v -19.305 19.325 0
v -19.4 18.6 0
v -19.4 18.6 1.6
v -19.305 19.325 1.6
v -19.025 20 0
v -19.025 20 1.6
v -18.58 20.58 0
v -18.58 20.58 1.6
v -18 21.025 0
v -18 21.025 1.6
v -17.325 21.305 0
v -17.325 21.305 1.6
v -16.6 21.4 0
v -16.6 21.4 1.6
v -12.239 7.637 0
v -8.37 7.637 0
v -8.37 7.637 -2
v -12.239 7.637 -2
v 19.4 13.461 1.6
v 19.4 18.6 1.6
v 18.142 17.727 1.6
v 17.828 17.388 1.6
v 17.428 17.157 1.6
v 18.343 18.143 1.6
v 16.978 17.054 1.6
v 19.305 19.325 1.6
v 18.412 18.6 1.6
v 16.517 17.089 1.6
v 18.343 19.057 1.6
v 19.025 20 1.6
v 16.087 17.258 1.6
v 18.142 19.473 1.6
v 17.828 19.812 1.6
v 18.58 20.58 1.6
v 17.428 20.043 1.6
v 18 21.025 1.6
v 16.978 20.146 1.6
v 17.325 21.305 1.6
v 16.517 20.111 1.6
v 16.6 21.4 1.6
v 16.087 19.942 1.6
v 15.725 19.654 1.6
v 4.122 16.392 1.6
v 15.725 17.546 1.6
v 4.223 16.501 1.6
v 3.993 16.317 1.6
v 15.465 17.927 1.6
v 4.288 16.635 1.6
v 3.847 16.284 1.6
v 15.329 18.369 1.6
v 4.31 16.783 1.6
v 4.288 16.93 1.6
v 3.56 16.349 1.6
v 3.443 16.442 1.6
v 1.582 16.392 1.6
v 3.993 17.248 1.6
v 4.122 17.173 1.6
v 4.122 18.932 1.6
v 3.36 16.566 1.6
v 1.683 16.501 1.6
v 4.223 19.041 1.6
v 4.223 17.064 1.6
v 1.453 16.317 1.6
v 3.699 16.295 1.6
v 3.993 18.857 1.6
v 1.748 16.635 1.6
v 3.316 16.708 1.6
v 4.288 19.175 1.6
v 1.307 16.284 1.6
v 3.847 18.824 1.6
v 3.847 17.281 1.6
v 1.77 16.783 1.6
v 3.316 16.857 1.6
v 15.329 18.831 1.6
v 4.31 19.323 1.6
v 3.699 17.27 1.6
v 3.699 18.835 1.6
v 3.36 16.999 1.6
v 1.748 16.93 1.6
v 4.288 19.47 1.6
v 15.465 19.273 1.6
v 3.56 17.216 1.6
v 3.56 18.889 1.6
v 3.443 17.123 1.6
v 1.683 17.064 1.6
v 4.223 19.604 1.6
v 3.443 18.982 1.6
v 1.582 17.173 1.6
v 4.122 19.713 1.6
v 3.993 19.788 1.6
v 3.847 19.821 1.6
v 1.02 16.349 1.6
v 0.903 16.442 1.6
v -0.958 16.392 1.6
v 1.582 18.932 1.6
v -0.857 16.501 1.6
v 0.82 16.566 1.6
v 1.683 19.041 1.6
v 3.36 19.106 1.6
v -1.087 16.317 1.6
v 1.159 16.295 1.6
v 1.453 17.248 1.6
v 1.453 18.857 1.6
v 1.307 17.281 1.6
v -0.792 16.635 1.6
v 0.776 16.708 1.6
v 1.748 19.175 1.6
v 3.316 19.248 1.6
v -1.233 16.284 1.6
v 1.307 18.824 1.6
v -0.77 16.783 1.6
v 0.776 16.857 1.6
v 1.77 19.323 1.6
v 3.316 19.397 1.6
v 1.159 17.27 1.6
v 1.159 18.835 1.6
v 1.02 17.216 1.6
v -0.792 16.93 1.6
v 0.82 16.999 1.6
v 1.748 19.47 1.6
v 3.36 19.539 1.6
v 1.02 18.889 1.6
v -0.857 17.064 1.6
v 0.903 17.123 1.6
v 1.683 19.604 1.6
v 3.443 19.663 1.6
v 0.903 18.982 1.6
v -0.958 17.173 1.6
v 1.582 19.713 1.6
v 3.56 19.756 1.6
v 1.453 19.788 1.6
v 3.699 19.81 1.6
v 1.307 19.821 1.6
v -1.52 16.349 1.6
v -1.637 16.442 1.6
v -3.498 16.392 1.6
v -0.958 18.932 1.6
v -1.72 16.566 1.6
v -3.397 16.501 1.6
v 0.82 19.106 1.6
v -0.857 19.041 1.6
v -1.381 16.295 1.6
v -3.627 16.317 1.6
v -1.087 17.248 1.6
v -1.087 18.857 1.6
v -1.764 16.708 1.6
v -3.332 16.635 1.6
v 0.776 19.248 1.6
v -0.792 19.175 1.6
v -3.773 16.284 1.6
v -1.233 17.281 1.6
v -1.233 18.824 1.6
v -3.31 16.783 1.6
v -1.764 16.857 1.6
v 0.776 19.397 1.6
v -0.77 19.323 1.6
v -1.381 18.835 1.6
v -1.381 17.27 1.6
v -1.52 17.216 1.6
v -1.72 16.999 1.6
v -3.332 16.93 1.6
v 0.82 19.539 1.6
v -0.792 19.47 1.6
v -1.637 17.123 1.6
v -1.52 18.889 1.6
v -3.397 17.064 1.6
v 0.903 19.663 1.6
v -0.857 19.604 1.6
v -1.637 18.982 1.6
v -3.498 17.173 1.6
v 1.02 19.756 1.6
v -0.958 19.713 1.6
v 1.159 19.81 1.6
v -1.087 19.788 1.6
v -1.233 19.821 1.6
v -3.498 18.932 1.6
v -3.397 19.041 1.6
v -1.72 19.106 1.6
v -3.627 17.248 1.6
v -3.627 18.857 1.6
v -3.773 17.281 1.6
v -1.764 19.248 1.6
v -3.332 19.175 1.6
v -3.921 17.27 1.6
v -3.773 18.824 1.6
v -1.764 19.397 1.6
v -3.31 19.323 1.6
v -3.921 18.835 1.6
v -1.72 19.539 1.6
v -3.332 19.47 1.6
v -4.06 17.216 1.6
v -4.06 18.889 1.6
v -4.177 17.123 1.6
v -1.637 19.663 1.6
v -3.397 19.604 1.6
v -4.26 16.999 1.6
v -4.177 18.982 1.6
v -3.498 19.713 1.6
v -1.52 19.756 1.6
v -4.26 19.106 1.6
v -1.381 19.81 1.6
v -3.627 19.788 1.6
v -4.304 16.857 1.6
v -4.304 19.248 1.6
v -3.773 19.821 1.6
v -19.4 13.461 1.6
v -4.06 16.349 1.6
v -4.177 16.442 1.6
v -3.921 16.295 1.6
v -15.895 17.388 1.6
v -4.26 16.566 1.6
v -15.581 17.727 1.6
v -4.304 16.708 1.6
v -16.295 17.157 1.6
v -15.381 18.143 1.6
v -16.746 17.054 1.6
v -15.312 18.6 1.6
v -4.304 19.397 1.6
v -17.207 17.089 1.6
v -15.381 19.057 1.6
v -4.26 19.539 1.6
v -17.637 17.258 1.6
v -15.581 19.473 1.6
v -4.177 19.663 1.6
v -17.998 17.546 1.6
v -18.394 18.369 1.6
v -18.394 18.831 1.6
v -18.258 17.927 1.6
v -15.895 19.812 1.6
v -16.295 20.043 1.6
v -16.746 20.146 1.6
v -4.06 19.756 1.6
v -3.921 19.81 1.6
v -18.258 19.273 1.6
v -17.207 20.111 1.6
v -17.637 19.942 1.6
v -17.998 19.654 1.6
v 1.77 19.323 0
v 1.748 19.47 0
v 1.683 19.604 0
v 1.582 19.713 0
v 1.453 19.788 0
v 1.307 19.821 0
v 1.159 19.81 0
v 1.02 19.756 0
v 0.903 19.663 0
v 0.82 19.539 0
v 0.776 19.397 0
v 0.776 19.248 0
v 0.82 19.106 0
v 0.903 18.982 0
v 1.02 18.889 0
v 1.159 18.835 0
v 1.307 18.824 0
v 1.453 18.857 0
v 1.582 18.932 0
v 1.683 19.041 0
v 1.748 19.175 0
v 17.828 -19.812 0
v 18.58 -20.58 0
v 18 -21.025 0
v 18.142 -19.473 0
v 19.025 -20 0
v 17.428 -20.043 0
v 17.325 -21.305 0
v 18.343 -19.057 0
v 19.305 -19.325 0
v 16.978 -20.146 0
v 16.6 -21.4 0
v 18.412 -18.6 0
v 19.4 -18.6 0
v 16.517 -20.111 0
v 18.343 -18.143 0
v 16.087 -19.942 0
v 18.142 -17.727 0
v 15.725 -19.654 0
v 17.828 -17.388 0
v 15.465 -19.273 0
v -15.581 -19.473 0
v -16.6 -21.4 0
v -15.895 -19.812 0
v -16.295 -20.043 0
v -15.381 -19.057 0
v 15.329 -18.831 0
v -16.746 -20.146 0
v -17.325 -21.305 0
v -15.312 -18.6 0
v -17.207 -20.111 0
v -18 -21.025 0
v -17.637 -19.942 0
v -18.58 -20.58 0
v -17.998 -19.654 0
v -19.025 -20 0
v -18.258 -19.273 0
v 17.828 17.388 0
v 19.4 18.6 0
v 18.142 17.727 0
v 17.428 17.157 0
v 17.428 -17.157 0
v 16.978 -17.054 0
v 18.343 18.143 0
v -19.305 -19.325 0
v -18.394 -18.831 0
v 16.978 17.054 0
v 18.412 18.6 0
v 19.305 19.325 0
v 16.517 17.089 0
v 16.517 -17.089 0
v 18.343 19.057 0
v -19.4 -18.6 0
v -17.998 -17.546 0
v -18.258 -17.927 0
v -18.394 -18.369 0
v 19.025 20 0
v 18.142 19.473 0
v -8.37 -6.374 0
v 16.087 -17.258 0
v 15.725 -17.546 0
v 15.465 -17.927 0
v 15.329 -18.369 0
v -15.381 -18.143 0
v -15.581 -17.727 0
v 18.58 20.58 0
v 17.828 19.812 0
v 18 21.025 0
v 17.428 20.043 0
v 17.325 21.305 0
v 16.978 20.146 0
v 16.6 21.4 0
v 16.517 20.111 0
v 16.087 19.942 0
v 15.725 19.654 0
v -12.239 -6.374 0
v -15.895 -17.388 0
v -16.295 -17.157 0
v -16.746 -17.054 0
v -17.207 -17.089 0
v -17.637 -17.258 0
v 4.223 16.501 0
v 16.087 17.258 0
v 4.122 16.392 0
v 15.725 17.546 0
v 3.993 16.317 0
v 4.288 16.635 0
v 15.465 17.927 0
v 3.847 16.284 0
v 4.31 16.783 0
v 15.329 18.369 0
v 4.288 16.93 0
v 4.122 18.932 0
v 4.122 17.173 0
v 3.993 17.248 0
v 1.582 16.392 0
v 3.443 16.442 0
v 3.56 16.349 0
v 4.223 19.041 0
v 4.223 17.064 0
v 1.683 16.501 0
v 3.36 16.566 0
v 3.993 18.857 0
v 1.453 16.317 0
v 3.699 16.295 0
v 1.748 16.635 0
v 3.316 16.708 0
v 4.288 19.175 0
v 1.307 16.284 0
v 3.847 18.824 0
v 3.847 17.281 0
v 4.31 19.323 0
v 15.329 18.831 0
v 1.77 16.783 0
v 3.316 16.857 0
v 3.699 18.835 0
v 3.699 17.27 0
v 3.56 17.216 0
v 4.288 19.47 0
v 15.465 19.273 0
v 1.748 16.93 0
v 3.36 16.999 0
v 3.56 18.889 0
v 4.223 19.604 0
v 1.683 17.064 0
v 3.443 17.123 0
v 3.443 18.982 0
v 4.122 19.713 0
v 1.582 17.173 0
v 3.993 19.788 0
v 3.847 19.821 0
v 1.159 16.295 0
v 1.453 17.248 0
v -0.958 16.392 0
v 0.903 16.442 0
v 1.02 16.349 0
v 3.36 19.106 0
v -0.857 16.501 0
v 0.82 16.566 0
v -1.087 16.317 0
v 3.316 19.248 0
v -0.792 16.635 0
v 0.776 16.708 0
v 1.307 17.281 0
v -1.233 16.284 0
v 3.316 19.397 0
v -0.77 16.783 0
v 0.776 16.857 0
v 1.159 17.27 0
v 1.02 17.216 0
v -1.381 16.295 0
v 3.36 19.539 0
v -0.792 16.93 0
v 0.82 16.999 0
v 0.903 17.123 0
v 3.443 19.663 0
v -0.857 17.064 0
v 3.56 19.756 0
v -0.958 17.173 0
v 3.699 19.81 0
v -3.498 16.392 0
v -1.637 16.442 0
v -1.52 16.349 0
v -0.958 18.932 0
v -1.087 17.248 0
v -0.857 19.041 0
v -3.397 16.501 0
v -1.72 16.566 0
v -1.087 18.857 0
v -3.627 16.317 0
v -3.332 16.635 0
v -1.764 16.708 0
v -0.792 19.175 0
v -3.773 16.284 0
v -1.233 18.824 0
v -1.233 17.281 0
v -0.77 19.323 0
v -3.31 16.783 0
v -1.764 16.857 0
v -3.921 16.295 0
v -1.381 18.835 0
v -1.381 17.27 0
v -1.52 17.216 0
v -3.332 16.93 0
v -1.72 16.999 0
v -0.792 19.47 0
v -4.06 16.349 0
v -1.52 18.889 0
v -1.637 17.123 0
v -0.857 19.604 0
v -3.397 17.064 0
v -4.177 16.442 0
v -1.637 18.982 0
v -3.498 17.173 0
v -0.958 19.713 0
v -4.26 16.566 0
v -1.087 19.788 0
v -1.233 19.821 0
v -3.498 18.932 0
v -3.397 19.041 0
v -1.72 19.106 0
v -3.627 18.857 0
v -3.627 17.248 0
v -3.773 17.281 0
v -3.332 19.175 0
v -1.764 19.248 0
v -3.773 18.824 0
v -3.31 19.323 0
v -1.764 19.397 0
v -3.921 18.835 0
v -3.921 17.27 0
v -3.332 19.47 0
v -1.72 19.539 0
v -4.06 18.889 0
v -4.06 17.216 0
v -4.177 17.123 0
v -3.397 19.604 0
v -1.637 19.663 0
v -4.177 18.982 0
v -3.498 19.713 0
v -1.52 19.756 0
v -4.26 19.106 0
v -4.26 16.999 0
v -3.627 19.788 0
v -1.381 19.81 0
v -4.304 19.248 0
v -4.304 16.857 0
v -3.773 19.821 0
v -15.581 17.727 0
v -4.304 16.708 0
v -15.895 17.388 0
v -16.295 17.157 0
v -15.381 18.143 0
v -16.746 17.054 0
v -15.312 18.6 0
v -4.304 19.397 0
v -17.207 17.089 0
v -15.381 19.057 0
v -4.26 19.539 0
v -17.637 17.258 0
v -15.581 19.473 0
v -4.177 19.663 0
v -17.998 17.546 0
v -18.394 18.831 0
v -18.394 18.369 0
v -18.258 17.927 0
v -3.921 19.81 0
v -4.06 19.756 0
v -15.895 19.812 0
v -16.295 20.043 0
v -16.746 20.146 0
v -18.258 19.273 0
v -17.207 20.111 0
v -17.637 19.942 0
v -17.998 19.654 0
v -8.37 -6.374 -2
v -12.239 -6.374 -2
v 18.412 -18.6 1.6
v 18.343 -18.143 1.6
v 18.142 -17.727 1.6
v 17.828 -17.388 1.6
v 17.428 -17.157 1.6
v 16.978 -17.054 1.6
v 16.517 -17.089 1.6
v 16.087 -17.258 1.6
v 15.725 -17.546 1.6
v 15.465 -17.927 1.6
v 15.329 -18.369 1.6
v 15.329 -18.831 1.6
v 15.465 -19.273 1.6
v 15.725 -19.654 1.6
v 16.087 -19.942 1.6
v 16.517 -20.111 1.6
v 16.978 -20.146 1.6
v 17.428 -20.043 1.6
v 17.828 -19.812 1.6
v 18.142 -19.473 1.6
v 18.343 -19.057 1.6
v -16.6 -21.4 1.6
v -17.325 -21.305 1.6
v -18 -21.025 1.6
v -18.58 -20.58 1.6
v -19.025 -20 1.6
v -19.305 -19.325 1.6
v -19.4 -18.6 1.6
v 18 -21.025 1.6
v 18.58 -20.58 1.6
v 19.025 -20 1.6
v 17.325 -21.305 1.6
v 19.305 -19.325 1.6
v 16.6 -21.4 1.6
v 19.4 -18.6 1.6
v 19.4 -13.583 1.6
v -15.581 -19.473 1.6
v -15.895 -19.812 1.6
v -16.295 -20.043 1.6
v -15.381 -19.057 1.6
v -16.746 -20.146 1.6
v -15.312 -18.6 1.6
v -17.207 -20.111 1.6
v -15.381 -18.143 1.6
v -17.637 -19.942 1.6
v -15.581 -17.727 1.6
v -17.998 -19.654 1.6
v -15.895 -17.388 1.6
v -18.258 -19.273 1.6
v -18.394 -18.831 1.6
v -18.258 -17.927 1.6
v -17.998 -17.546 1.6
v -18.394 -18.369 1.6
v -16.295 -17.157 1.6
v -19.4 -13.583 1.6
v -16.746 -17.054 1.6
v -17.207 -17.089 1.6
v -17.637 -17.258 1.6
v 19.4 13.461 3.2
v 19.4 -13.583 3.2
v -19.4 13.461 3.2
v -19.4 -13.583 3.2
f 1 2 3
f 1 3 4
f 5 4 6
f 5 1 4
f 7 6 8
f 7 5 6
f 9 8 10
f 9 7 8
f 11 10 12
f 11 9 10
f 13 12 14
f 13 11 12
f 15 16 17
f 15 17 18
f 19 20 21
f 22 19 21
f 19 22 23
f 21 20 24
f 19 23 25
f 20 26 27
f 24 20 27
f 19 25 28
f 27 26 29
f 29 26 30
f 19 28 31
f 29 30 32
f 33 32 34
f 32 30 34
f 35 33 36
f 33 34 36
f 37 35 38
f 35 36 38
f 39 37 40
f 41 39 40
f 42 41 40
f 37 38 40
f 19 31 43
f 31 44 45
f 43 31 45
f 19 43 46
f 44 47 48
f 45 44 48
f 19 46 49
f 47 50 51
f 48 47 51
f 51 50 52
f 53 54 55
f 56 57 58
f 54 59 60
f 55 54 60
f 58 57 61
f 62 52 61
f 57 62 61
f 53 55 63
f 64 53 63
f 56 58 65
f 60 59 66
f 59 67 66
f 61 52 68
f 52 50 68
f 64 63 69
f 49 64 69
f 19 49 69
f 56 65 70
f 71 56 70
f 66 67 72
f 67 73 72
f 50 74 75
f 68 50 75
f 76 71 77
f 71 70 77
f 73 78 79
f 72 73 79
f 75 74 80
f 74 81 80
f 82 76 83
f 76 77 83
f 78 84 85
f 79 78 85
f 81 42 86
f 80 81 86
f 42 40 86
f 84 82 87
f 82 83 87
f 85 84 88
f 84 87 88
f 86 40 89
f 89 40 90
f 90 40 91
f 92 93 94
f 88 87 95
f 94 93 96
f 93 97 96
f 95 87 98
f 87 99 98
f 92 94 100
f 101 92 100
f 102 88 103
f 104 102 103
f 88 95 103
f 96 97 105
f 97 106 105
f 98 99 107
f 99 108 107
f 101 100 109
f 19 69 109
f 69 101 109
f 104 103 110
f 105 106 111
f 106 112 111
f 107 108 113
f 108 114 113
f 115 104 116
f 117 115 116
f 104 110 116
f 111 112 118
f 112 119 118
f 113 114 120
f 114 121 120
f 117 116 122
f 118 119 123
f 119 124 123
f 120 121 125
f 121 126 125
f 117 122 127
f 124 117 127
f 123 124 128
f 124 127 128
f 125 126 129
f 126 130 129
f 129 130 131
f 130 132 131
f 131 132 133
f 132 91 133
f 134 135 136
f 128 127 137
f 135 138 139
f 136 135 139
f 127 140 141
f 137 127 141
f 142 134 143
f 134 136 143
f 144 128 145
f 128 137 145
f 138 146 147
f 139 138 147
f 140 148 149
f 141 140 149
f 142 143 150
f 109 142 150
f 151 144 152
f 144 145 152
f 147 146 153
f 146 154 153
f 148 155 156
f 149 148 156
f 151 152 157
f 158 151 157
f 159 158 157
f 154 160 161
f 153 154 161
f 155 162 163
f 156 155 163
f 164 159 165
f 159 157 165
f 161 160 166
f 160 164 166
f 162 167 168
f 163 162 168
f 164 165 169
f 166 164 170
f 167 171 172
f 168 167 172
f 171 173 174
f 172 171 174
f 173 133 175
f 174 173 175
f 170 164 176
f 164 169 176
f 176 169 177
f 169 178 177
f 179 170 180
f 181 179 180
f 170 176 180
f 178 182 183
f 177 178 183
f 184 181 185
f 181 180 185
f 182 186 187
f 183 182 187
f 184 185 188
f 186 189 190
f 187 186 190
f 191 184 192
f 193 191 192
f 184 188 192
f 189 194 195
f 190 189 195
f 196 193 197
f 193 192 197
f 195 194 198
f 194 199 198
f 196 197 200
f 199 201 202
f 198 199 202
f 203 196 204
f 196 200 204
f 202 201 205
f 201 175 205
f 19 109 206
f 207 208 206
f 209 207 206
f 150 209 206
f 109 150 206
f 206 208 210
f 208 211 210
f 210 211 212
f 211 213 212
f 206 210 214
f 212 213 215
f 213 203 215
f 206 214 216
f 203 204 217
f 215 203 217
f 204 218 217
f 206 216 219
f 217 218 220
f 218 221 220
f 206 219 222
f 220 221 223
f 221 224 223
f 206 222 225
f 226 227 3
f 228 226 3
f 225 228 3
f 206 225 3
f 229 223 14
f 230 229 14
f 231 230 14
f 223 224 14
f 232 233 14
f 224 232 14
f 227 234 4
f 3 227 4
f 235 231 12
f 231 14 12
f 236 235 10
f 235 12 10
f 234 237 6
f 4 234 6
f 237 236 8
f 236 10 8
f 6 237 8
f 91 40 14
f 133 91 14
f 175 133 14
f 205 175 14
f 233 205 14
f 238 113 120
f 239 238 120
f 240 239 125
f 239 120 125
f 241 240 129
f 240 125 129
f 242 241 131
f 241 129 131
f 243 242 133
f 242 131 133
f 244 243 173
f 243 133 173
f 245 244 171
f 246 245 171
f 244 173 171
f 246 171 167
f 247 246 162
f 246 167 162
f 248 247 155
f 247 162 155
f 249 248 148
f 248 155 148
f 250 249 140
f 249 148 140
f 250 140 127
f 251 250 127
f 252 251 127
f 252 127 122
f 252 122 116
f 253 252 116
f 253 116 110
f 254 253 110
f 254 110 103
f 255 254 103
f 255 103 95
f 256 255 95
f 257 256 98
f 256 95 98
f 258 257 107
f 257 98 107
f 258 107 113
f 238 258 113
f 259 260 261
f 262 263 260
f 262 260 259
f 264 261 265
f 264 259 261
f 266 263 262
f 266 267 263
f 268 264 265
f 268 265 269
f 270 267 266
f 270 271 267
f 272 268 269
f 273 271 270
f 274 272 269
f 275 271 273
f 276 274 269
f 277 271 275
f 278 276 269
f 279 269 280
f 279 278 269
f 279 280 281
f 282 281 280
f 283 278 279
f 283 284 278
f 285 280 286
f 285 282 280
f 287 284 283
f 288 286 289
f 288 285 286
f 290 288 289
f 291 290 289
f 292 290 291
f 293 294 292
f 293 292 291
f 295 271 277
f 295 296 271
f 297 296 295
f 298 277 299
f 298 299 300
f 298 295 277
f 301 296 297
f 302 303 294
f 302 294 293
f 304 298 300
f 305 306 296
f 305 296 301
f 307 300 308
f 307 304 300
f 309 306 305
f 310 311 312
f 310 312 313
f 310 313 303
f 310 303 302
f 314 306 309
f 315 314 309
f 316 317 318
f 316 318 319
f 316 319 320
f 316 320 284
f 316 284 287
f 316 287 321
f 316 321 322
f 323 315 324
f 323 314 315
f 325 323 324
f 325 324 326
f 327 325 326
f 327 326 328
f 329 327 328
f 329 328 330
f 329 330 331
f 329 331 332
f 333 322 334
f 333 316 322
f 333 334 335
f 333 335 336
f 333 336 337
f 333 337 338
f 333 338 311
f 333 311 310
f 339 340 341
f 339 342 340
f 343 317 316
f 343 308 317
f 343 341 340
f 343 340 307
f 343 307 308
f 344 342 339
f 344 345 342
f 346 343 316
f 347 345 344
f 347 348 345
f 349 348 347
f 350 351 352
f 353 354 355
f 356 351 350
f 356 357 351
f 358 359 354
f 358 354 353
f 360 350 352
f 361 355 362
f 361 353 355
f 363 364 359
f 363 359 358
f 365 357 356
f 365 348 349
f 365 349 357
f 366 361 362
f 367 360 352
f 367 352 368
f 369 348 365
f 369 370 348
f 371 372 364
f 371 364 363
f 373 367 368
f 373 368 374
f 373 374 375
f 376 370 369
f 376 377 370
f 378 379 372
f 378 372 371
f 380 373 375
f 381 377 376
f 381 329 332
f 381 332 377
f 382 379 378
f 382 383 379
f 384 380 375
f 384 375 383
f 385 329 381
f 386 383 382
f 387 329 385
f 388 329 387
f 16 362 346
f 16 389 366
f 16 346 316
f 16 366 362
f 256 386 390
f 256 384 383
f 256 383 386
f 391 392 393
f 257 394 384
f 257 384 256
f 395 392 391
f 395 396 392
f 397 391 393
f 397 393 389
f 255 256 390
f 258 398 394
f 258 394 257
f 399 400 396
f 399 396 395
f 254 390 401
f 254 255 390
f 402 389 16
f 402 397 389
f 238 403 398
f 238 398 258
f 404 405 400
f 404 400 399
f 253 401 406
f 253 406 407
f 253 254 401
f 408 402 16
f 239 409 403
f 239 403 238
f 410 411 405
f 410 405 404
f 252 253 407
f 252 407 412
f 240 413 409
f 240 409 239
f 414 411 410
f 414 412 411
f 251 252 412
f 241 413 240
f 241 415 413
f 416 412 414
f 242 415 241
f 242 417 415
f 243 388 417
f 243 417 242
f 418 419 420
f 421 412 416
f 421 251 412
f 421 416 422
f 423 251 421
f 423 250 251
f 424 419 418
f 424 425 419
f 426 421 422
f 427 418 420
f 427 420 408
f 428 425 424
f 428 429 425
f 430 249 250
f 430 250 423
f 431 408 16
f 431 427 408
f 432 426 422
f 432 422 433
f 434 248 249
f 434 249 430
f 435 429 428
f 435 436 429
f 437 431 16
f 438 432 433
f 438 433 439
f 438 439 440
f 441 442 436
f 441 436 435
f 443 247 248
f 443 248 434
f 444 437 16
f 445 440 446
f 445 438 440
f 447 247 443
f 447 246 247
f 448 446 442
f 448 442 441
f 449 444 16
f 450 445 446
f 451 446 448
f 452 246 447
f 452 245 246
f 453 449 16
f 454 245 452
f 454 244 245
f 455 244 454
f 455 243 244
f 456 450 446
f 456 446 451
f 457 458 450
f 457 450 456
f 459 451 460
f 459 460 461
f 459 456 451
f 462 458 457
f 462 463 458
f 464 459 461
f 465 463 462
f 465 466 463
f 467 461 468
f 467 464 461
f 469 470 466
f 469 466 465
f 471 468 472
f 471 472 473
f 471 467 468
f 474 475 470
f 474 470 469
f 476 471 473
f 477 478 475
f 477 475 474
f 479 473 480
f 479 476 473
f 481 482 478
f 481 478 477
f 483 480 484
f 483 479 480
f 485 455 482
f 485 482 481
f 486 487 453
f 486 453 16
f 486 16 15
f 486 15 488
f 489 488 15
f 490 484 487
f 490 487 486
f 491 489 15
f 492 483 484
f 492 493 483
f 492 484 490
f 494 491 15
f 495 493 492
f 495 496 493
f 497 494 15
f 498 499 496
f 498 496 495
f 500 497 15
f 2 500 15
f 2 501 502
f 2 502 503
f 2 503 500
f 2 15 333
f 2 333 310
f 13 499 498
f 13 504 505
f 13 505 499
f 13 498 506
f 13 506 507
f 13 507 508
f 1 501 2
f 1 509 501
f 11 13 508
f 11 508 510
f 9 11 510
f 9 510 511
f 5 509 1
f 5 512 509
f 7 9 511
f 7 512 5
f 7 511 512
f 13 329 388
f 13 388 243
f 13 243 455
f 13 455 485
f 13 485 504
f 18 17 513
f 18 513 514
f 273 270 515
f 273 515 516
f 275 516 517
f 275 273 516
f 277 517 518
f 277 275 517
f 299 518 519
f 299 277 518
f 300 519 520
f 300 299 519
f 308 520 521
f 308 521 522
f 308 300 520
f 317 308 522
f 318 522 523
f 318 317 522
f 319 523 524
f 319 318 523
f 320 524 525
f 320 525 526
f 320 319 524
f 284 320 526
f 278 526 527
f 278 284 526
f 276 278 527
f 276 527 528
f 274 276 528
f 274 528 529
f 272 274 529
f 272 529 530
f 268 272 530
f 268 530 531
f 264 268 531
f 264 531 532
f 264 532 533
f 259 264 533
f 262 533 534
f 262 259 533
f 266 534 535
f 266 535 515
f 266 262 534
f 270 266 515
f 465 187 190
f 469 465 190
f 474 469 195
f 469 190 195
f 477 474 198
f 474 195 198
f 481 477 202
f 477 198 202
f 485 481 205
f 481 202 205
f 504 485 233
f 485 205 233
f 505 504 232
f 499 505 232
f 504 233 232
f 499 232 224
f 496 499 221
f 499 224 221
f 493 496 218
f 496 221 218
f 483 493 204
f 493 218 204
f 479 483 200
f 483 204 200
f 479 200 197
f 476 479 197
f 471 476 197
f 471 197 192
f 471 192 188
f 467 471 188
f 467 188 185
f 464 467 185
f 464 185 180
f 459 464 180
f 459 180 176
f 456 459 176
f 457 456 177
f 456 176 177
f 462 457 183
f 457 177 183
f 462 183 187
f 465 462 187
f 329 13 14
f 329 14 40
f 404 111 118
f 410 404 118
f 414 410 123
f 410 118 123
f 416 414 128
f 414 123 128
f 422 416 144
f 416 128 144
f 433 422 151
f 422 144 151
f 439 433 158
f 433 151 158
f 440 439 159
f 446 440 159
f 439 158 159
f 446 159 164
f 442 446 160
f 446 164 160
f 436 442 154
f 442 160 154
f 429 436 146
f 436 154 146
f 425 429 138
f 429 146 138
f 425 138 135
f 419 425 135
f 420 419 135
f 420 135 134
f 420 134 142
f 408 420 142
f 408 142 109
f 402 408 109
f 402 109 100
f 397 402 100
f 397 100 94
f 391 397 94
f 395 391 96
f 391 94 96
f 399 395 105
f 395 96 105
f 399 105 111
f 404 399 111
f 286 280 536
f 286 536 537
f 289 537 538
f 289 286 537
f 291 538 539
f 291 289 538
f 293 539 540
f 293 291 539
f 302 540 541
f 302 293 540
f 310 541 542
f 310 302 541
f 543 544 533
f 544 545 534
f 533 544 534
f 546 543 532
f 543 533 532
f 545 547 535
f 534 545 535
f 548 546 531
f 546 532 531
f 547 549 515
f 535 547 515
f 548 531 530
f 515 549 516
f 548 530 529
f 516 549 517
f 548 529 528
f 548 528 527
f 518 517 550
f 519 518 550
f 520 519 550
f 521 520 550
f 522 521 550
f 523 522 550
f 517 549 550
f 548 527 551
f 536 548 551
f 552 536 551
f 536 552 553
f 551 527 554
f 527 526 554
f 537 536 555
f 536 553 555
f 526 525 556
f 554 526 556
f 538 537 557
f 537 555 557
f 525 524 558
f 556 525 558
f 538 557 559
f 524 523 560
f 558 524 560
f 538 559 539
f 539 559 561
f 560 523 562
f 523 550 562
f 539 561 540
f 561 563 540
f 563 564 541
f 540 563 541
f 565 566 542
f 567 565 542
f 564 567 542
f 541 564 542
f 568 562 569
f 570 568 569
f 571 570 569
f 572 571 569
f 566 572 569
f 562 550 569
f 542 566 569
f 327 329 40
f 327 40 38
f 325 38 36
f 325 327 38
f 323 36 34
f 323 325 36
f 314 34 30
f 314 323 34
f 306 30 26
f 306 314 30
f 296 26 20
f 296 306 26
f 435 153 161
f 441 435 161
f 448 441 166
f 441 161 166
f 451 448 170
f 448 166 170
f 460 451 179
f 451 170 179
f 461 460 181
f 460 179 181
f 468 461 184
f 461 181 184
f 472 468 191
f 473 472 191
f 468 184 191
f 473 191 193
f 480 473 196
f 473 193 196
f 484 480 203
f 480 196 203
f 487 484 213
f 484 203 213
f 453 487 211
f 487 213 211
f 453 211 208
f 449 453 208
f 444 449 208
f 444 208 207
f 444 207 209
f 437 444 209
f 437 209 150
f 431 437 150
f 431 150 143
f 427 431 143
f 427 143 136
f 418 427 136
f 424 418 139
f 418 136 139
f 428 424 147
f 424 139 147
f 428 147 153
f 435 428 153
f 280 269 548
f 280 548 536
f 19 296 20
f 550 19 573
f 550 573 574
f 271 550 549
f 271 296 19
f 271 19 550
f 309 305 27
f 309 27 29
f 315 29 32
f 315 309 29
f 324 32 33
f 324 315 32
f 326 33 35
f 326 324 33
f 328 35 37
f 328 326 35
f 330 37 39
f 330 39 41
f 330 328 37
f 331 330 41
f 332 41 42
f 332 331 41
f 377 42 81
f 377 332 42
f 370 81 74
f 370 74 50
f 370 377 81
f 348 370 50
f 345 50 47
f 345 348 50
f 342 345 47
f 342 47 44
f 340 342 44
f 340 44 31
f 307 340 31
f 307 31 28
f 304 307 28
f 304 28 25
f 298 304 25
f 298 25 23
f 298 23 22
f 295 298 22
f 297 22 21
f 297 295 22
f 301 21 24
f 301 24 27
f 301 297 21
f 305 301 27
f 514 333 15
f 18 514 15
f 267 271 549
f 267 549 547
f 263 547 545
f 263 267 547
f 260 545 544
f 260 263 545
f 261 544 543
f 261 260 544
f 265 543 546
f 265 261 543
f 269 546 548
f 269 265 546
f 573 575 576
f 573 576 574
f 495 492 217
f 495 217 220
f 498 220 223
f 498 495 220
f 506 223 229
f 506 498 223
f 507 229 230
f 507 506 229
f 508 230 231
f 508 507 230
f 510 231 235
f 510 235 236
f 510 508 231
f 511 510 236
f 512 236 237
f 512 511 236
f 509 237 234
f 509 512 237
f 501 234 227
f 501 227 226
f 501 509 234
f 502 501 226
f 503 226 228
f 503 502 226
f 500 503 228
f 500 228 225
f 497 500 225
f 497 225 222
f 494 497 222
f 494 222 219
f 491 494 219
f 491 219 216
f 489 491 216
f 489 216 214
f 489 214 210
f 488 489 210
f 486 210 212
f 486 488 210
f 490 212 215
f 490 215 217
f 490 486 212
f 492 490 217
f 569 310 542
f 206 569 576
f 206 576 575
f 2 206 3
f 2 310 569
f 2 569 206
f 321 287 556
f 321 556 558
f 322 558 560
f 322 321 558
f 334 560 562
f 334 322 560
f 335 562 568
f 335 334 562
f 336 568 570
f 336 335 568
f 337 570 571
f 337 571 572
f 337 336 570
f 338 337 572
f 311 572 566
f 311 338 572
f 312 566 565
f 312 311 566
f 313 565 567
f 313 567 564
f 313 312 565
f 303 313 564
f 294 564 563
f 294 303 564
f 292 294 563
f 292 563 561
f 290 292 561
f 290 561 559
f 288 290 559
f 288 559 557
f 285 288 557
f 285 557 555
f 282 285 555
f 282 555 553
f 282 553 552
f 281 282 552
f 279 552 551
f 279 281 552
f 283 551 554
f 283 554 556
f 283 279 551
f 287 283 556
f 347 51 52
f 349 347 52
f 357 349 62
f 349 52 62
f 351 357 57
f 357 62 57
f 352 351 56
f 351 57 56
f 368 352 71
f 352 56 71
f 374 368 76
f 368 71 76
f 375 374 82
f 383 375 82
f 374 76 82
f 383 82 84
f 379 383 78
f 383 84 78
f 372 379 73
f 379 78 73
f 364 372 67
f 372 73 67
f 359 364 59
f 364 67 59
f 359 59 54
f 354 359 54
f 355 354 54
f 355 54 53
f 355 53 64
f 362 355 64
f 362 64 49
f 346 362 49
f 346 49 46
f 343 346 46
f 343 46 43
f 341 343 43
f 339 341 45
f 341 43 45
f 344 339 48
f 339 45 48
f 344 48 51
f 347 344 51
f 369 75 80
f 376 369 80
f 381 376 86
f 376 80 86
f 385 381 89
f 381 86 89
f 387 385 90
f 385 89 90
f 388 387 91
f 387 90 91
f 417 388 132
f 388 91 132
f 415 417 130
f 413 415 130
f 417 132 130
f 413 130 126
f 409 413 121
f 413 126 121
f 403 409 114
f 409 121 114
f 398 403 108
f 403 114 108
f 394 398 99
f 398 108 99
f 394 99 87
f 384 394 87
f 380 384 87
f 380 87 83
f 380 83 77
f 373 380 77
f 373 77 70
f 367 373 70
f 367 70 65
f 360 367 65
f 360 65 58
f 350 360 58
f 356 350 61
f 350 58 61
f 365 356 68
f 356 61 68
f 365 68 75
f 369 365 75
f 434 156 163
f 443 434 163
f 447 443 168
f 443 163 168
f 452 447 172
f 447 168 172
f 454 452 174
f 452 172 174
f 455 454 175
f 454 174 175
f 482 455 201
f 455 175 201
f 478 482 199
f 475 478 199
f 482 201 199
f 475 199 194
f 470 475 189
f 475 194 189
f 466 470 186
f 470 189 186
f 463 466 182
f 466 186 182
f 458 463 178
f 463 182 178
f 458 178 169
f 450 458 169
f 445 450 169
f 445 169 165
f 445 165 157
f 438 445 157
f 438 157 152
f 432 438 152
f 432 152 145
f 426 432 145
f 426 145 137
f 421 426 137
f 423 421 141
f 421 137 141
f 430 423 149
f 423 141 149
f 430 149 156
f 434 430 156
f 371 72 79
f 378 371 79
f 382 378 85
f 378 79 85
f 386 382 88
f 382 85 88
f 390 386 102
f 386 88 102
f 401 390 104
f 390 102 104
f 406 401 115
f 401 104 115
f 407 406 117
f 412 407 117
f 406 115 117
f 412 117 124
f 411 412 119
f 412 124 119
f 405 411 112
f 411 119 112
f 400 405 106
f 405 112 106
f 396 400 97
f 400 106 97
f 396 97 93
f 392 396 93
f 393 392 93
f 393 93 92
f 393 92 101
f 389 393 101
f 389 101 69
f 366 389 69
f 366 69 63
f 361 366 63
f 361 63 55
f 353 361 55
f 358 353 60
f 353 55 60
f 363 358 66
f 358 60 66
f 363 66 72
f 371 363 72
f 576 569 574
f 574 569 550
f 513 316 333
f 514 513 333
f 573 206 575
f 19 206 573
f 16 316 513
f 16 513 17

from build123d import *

# Parameters (mm, degrees)
SKIZZE1_R                       = 1.55
AUFSATZ_LINEAR_AUSTRAGEN1_DEPTH = 1.6
SKIZZE2_R                       = 0.5
SCHNITT_LINEAR_AUSTRAGEN1_DEPTH = 1.6
SKIZZE3_W                       = 38.8
SKIZZE3_H                       = 27.043851976
AUFSATZ_LINEAR_AUSTRAGEN2_DEPTH = 1.6
SKIZZE4_W                       = 3.86922581
SKIZZE4_H                       = 14.010670301
AUFSATZ_LINEAR_AUSTRAGEN3_DEPTH = 2


with BuildPart() as part:
    # Skizze1 → Aufsatz-Linear austragen1 (new body)
    with BuildSketch(Plane.XY):
        with BuildLine():
            Line((16.6, -21.4), (-16.6, -21.4))
            ThreePointArc((-16.6, -21.4), (-18.579898987, -20.579898987), (-19.4, -18.6))
            Line((-19.4, -18.6), (-19.4, 18.6))
            ThreePointArc((-19.4, 18.6), (-18.579898987, 20.579898987), (-16.6, 21.4))
            Line((-16.6, 21.4), (16.6, 21.4))
            ThreePointArc((16.6, 21.4), (18.579898987, 20.579898987), (19.4, 18.6))
            Line((19.4, 18.6), (19.4, -18.6))
            ThreePointArc((19.4, -18.6), (18.579898987, -20.579898987), (16.6, -21.4))
        make_face()
        with Locations((-16.861682243, 18.6)):
            Circle(SKIZZE1_R, mode=Mode.SUBTRACT)
        with Locations((-16.861682243, -18.6)):
            Circle(SKIZZE1_R, mode=Mode.SUBTRACT)
        with Locations((16.861682243, -18.6)):
            Circle(SKIZZE1_R, mode=Mode.SUBTRACT)
        with Locations((16.861682243, 18.6)):
            Circle(SKIZZE1_R, mode=Mode.SUBTRACT)
    extrude(amount=AUFSATZ_LINEAR_AUSTRAGEN1_DEPTH)

    # Skizze2 → Schnitt-Linear austragen1 (cut)
    with BuildSketch(Plane.XY.offset(1.6)):
        with Locations((-3.81, 16.782506105)):
            Circle(SKIZZE2_R)
        with Locations((-1.27, 16.782506105)):
            Circle(SKIZZE2_R)
        with Locations((1.27, 16.782506105)):
            Circle(SKIZZE2_R)
        with Locations((3.81, 16.782506105)):
            Circle(SKIZZE2_R)
        with Locations((-1.27, 19.322506105)):
            Circle(SKIZZE2_R)
        with Locations((1.27, 19.322506105)):
            Circle(SKIZZE2_R)
        with Locations((3.81, 19.322506105)):
            Circle(SKIZZE2_R)
        with Locations((-3.81, 19.322506105)):
            Circle(SKIZZE2_R)
    extrude(amount=-SCHNITT_LINEAR_AUSTRAGEN1_DEPTH, mode=Mode.SUBTRACT)

    # Skizze3 → Aufsatz-Linear austragen2 (add)
    with BuildSketch(Plane.XY.offset(1.6)):
        with Locations((0, -0.061093039)):
            Rectangle(SKIZZE3_W, SKIZZE3_H)
    extrude(amount=AUFSATZ_LINEAR_AUSTRAGEN2_DEPTH)

    # Skizze4 → Aufsatz-Linear austragen3 (add)
    with BuildSketch(Plane(origin=(0, 0, 0), x_dir=(-1, 0, 0), z_dir=(0, 0, -1))):
        with Locations((10.304359262, 0.631294738)):
            Rectangle(SKIZZE4_W, SKIZZE4_H)
    extrude(amount=AUFSATZ_LINEAR_AUSTRAGEN3_DEPTH)


solid = part.part
